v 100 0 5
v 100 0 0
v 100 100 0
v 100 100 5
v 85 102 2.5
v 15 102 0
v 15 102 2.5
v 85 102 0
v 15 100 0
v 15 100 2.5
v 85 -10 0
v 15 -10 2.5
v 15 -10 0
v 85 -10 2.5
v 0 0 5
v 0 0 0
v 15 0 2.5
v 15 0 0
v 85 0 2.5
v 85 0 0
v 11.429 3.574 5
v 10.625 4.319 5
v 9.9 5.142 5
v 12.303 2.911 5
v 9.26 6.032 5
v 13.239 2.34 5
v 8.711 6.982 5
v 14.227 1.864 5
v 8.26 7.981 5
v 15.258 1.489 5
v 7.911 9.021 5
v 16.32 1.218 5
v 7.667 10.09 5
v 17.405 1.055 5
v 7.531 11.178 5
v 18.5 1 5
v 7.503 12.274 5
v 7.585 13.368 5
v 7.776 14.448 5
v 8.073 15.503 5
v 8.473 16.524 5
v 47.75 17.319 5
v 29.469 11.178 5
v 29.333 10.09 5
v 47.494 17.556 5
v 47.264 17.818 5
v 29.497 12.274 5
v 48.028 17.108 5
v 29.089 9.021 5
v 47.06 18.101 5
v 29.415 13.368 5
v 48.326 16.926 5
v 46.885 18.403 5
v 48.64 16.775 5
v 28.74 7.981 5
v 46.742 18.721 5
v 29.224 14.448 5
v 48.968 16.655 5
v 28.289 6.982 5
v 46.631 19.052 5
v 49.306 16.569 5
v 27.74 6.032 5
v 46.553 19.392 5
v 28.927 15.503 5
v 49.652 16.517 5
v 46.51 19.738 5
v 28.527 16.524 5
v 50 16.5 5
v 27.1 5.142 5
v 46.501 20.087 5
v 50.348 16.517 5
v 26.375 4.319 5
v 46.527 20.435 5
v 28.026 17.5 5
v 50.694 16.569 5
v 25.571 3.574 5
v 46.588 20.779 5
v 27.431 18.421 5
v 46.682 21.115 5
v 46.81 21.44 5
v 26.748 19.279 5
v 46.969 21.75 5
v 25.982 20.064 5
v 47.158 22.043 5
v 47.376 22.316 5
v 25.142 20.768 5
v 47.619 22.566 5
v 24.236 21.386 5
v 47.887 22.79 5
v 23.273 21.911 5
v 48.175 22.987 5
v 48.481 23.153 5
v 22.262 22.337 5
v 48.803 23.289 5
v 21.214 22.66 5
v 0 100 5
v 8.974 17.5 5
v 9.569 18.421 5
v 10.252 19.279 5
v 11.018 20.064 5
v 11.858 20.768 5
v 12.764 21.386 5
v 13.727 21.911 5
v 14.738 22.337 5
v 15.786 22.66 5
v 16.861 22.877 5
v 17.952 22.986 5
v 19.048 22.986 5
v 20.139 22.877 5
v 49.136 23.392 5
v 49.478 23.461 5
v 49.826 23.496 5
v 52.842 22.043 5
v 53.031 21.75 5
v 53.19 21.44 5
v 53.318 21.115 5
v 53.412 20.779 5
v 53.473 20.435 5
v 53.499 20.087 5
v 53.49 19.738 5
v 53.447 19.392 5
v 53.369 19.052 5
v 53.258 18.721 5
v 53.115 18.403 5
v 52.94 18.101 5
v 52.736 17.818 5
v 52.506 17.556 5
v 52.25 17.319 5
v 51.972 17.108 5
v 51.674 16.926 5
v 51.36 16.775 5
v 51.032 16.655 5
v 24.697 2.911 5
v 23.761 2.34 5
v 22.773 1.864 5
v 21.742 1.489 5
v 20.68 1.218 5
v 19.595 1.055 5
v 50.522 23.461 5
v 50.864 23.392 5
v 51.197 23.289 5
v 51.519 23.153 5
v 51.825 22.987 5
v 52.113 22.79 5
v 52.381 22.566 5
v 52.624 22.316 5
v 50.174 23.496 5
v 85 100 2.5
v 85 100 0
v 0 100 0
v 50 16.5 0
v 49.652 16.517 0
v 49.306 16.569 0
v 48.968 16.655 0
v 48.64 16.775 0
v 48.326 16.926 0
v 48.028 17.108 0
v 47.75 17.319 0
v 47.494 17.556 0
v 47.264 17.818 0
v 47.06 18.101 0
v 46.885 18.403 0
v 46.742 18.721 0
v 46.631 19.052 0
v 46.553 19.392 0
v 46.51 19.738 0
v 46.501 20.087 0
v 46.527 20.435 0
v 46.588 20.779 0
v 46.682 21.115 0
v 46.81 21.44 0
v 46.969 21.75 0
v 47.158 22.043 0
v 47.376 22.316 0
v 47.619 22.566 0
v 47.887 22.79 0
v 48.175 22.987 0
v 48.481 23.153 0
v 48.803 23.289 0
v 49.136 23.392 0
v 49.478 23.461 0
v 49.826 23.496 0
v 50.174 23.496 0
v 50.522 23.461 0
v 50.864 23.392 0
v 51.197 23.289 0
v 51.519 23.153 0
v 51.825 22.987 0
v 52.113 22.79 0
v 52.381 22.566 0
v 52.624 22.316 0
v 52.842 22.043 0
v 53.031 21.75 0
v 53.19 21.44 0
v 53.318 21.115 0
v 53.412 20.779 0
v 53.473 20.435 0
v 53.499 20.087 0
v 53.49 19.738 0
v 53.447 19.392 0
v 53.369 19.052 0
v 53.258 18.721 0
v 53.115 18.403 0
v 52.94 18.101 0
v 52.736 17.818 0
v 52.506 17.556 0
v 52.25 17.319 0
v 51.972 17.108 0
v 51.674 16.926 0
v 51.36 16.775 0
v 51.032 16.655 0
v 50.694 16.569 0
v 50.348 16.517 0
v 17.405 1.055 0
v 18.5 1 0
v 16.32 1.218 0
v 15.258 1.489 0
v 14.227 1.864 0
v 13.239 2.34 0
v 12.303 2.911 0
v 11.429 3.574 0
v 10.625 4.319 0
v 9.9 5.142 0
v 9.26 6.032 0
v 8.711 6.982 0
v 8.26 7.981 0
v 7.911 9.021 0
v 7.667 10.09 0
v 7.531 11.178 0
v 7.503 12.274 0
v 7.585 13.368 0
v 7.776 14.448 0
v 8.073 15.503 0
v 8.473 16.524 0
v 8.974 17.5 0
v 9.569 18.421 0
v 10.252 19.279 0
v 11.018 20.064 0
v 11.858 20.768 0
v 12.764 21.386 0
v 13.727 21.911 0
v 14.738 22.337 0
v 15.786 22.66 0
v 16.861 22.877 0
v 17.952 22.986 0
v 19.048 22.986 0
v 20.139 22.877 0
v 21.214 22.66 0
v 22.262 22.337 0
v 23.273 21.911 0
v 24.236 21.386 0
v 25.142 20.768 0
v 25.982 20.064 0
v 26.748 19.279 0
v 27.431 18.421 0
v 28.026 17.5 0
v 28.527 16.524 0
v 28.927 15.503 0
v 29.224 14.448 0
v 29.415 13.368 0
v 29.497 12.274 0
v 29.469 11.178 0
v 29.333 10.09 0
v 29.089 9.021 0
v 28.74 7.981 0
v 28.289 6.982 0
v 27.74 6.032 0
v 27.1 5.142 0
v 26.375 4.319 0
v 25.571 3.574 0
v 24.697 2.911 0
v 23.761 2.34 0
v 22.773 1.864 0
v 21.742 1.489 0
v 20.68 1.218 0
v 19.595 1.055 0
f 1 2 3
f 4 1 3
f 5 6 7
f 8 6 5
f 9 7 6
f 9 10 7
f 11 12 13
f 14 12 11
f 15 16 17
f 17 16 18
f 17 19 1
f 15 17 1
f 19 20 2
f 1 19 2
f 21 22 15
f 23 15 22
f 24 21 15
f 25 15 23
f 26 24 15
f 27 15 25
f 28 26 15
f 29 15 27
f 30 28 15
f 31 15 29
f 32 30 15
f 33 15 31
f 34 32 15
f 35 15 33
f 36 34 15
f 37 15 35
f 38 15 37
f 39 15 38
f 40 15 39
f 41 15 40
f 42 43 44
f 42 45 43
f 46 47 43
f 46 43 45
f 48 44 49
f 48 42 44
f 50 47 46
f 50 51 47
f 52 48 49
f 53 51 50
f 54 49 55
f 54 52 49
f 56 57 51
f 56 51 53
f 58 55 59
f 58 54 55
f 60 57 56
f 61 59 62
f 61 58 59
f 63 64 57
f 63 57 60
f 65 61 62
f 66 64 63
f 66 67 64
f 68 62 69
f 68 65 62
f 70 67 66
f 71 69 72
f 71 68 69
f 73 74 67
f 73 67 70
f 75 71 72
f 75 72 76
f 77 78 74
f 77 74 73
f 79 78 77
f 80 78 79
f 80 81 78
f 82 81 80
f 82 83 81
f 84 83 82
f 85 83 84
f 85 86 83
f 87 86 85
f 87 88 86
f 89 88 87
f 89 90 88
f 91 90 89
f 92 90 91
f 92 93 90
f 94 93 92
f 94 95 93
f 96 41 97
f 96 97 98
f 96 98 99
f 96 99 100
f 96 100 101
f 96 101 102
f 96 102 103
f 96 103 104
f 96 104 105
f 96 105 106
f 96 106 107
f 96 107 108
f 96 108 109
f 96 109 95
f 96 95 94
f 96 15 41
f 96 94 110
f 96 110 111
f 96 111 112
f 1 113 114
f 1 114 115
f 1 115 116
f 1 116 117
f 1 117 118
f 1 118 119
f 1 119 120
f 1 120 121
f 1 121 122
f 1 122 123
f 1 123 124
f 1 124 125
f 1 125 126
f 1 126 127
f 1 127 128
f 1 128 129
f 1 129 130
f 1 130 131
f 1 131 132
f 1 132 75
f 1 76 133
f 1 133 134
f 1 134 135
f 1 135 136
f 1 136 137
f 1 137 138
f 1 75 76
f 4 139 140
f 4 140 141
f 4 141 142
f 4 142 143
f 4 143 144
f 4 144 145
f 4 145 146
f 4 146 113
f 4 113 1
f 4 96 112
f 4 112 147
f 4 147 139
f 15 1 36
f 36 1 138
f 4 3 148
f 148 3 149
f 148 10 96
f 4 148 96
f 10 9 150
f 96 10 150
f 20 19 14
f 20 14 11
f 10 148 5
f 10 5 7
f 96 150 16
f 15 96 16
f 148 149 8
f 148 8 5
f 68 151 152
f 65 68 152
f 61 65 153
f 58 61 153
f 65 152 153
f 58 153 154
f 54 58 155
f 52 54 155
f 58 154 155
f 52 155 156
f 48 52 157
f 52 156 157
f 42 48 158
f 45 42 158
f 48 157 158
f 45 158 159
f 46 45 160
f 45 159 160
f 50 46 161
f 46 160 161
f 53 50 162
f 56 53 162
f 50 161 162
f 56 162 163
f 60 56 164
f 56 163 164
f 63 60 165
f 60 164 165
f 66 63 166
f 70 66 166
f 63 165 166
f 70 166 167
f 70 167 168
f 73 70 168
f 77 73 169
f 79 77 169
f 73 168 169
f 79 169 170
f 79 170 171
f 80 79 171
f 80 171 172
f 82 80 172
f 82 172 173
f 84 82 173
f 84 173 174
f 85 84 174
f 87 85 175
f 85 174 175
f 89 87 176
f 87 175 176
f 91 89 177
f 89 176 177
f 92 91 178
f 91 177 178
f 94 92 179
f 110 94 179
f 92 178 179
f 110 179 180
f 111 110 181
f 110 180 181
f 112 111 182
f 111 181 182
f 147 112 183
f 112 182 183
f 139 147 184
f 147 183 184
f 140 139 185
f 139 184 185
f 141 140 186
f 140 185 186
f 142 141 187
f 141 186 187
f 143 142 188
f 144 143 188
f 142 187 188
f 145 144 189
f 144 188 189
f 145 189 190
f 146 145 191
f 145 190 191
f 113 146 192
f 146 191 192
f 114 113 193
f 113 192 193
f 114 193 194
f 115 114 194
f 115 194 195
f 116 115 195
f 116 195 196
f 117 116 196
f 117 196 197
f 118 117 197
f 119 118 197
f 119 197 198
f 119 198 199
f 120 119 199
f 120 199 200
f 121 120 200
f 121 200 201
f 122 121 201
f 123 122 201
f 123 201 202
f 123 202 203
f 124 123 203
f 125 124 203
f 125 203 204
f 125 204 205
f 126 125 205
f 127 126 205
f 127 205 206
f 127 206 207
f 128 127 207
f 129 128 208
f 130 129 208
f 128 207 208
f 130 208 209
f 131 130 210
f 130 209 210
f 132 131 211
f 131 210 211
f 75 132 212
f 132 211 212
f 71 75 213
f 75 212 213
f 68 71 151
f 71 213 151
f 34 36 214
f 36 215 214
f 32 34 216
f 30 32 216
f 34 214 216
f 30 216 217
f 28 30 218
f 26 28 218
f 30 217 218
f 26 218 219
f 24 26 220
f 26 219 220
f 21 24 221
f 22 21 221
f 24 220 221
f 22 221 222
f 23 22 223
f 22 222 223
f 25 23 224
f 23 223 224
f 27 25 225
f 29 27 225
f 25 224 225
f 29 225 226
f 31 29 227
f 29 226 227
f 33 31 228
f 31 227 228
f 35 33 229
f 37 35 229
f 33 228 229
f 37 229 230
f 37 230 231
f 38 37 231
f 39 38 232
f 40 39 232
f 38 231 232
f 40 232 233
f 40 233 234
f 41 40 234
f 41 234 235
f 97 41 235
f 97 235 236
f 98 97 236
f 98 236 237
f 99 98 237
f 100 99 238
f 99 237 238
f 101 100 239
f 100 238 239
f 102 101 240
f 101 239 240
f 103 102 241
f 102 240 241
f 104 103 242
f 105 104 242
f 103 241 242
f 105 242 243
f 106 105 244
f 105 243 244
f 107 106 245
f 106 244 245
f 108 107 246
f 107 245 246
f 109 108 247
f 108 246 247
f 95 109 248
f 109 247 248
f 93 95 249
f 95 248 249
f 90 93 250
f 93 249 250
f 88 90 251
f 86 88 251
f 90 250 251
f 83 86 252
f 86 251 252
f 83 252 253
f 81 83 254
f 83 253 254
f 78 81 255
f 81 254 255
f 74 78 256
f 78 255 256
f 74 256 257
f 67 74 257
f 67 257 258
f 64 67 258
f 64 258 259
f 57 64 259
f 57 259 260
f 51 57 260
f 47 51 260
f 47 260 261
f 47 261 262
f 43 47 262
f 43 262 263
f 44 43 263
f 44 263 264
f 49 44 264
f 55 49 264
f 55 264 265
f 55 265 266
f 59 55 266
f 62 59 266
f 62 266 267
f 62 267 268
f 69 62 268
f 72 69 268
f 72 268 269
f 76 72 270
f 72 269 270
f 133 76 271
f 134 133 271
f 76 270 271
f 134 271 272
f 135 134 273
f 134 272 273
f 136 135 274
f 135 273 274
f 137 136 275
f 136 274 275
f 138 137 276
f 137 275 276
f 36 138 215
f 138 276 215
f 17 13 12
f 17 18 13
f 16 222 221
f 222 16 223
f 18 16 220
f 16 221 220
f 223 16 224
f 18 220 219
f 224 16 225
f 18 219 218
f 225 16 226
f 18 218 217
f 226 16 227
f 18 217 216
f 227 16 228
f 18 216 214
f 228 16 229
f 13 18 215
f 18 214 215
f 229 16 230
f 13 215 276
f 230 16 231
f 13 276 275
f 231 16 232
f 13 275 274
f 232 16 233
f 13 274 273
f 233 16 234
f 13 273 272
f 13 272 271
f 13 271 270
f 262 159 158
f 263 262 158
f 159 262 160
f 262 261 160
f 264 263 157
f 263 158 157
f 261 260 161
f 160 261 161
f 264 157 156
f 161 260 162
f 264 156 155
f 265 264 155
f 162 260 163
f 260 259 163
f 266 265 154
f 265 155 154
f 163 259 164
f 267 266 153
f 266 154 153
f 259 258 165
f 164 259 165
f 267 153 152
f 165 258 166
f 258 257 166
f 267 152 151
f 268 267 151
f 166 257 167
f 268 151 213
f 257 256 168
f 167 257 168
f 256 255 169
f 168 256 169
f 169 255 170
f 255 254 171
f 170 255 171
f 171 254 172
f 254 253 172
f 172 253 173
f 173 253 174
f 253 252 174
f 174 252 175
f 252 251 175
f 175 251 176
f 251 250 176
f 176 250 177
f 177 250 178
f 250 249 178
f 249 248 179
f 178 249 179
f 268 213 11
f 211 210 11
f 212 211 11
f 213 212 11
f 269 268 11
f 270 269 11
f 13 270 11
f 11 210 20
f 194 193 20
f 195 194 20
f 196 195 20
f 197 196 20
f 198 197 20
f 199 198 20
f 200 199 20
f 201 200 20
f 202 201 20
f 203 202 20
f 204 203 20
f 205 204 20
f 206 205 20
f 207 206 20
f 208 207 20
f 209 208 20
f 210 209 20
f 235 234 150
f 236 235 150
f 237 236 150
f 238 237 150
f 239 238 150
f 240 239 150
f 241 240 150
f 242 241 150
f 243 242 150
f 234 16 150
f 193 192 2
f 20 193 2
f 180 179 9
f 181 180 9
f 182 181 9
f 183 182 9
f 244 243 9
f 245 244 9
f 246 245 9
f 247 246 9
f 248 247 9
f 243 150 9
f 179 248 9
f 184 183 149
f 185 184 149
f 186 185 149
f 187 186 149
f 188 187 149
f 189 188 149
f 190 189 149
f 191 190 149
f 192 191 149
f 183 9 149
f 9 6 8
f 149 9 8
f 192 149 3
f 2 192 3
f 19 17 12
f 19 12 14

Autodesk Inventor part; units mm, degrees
ref_plane "YZ Plane" through (0, 0, 0) normal (1, 0, 0) x (0, 1, 0)
ref_plane "XZ Plane" through (0, 0, 0) normal (0, 1, 0) x (-1, 0, 0)
ref_plane "XY Plane" through (0, 0, 0) normal (0, 0, 1) x (1, 0, 0)
sketch "スケッチ1" plane through (0, 0, 0) normal (0, 0, 1) x (1, 0, 0)
  line L0 (0, 0) -> (100, 0)
  line L1 (100, 0) -> (100, 100)
  line L2 (100, 100) -> (0, 100)
  line L3 (0, 100) -> (0, 0)
  dimension "d0" = 100
  dimension "d1" = 100
extrude "押し出し1" add sketch "スケッチ1" along normal blind 5
sketch "スケッチ2" plane through (0, 0, 0) normal (0, -1, 0) x (1, 0, 0)
  line L0 (100, 5) -> (0, 5) projected
  line L1 (50, 5) -> (50, 0) construction
  line L2 (100, 0) -> (0, 0) projected
  line L3 (85, 0) -> (15, 0)
  line L4 (15, 0) -> (15, 2.5)
  line L5 (15, 2.5) -> (85, 2.5)
  line L6 (85, 2.5) -> (85, 0)
  point P0 (15, 0)
  dimension "d4" = 70
  dimension "d5" = 2.5
extrude "押し出し2" add sketch "スケッチ2" along normal blind 10
sketch "スケッチ3" plane through (0, 0, 5) normal (0, 0, 1) x (1, 0, 0)
  line L0 (100, 100) -> (0, 100) projected
  line L1 (50, 100) -> (50, 0) construction
  line L2 (15, 0) -> (85, 0) projected
  point P0 (0, 0)
  point P1 (50, 20)
  dimension "d15" = 20
hole "穴1" at (50, 20, 5) direction (0, 0, -1) diameter 7 end through all
sketch "スケッチ4" plane through (0, 0, 5) normal (0, 0, 1) x (1, 0, 0)
  line L0 (0, 100) -> (0, 0) projected
  line L1 (0, 12) -> (100, 12) construction
  line L2 (100, 0) -> (100, 100) projected
  circle A0 centre (50, 20) radius 3.5 projected
  point P0 (18.5, 12)
  dimension "d16" = 12
  dimension "d17" = 32.5
hole "穴2" at (18.5, 12, 5) direction (0, 0, -1) diameter 22 end through all
sketch "スケッチ5" plane through (0, 100, 0) normal (0, 1, 0) x (1, 0, 0)
  line L0 (15, 0) -> (85, 0) projected
  line L1 (50, 0) -> (50, -5) construction
  line L2 (53.5, -5) -> (46.5, -5) projected
  line L3 (15, 0) -> (85, 0)
  line L4 (85, 0) -> (85, -2.5)
  line L5 (85, -2.5) -> (15, -2.5)
  line L6 (15, -2.5) -> (15, 0)
  point P0 (0, 0)
  dimension "d25" = 2.5
  dimension "d26" = 70
extrude "押し出し3" add sketch "スケッチ5" along normal blind 2
properties part number "body_left"
